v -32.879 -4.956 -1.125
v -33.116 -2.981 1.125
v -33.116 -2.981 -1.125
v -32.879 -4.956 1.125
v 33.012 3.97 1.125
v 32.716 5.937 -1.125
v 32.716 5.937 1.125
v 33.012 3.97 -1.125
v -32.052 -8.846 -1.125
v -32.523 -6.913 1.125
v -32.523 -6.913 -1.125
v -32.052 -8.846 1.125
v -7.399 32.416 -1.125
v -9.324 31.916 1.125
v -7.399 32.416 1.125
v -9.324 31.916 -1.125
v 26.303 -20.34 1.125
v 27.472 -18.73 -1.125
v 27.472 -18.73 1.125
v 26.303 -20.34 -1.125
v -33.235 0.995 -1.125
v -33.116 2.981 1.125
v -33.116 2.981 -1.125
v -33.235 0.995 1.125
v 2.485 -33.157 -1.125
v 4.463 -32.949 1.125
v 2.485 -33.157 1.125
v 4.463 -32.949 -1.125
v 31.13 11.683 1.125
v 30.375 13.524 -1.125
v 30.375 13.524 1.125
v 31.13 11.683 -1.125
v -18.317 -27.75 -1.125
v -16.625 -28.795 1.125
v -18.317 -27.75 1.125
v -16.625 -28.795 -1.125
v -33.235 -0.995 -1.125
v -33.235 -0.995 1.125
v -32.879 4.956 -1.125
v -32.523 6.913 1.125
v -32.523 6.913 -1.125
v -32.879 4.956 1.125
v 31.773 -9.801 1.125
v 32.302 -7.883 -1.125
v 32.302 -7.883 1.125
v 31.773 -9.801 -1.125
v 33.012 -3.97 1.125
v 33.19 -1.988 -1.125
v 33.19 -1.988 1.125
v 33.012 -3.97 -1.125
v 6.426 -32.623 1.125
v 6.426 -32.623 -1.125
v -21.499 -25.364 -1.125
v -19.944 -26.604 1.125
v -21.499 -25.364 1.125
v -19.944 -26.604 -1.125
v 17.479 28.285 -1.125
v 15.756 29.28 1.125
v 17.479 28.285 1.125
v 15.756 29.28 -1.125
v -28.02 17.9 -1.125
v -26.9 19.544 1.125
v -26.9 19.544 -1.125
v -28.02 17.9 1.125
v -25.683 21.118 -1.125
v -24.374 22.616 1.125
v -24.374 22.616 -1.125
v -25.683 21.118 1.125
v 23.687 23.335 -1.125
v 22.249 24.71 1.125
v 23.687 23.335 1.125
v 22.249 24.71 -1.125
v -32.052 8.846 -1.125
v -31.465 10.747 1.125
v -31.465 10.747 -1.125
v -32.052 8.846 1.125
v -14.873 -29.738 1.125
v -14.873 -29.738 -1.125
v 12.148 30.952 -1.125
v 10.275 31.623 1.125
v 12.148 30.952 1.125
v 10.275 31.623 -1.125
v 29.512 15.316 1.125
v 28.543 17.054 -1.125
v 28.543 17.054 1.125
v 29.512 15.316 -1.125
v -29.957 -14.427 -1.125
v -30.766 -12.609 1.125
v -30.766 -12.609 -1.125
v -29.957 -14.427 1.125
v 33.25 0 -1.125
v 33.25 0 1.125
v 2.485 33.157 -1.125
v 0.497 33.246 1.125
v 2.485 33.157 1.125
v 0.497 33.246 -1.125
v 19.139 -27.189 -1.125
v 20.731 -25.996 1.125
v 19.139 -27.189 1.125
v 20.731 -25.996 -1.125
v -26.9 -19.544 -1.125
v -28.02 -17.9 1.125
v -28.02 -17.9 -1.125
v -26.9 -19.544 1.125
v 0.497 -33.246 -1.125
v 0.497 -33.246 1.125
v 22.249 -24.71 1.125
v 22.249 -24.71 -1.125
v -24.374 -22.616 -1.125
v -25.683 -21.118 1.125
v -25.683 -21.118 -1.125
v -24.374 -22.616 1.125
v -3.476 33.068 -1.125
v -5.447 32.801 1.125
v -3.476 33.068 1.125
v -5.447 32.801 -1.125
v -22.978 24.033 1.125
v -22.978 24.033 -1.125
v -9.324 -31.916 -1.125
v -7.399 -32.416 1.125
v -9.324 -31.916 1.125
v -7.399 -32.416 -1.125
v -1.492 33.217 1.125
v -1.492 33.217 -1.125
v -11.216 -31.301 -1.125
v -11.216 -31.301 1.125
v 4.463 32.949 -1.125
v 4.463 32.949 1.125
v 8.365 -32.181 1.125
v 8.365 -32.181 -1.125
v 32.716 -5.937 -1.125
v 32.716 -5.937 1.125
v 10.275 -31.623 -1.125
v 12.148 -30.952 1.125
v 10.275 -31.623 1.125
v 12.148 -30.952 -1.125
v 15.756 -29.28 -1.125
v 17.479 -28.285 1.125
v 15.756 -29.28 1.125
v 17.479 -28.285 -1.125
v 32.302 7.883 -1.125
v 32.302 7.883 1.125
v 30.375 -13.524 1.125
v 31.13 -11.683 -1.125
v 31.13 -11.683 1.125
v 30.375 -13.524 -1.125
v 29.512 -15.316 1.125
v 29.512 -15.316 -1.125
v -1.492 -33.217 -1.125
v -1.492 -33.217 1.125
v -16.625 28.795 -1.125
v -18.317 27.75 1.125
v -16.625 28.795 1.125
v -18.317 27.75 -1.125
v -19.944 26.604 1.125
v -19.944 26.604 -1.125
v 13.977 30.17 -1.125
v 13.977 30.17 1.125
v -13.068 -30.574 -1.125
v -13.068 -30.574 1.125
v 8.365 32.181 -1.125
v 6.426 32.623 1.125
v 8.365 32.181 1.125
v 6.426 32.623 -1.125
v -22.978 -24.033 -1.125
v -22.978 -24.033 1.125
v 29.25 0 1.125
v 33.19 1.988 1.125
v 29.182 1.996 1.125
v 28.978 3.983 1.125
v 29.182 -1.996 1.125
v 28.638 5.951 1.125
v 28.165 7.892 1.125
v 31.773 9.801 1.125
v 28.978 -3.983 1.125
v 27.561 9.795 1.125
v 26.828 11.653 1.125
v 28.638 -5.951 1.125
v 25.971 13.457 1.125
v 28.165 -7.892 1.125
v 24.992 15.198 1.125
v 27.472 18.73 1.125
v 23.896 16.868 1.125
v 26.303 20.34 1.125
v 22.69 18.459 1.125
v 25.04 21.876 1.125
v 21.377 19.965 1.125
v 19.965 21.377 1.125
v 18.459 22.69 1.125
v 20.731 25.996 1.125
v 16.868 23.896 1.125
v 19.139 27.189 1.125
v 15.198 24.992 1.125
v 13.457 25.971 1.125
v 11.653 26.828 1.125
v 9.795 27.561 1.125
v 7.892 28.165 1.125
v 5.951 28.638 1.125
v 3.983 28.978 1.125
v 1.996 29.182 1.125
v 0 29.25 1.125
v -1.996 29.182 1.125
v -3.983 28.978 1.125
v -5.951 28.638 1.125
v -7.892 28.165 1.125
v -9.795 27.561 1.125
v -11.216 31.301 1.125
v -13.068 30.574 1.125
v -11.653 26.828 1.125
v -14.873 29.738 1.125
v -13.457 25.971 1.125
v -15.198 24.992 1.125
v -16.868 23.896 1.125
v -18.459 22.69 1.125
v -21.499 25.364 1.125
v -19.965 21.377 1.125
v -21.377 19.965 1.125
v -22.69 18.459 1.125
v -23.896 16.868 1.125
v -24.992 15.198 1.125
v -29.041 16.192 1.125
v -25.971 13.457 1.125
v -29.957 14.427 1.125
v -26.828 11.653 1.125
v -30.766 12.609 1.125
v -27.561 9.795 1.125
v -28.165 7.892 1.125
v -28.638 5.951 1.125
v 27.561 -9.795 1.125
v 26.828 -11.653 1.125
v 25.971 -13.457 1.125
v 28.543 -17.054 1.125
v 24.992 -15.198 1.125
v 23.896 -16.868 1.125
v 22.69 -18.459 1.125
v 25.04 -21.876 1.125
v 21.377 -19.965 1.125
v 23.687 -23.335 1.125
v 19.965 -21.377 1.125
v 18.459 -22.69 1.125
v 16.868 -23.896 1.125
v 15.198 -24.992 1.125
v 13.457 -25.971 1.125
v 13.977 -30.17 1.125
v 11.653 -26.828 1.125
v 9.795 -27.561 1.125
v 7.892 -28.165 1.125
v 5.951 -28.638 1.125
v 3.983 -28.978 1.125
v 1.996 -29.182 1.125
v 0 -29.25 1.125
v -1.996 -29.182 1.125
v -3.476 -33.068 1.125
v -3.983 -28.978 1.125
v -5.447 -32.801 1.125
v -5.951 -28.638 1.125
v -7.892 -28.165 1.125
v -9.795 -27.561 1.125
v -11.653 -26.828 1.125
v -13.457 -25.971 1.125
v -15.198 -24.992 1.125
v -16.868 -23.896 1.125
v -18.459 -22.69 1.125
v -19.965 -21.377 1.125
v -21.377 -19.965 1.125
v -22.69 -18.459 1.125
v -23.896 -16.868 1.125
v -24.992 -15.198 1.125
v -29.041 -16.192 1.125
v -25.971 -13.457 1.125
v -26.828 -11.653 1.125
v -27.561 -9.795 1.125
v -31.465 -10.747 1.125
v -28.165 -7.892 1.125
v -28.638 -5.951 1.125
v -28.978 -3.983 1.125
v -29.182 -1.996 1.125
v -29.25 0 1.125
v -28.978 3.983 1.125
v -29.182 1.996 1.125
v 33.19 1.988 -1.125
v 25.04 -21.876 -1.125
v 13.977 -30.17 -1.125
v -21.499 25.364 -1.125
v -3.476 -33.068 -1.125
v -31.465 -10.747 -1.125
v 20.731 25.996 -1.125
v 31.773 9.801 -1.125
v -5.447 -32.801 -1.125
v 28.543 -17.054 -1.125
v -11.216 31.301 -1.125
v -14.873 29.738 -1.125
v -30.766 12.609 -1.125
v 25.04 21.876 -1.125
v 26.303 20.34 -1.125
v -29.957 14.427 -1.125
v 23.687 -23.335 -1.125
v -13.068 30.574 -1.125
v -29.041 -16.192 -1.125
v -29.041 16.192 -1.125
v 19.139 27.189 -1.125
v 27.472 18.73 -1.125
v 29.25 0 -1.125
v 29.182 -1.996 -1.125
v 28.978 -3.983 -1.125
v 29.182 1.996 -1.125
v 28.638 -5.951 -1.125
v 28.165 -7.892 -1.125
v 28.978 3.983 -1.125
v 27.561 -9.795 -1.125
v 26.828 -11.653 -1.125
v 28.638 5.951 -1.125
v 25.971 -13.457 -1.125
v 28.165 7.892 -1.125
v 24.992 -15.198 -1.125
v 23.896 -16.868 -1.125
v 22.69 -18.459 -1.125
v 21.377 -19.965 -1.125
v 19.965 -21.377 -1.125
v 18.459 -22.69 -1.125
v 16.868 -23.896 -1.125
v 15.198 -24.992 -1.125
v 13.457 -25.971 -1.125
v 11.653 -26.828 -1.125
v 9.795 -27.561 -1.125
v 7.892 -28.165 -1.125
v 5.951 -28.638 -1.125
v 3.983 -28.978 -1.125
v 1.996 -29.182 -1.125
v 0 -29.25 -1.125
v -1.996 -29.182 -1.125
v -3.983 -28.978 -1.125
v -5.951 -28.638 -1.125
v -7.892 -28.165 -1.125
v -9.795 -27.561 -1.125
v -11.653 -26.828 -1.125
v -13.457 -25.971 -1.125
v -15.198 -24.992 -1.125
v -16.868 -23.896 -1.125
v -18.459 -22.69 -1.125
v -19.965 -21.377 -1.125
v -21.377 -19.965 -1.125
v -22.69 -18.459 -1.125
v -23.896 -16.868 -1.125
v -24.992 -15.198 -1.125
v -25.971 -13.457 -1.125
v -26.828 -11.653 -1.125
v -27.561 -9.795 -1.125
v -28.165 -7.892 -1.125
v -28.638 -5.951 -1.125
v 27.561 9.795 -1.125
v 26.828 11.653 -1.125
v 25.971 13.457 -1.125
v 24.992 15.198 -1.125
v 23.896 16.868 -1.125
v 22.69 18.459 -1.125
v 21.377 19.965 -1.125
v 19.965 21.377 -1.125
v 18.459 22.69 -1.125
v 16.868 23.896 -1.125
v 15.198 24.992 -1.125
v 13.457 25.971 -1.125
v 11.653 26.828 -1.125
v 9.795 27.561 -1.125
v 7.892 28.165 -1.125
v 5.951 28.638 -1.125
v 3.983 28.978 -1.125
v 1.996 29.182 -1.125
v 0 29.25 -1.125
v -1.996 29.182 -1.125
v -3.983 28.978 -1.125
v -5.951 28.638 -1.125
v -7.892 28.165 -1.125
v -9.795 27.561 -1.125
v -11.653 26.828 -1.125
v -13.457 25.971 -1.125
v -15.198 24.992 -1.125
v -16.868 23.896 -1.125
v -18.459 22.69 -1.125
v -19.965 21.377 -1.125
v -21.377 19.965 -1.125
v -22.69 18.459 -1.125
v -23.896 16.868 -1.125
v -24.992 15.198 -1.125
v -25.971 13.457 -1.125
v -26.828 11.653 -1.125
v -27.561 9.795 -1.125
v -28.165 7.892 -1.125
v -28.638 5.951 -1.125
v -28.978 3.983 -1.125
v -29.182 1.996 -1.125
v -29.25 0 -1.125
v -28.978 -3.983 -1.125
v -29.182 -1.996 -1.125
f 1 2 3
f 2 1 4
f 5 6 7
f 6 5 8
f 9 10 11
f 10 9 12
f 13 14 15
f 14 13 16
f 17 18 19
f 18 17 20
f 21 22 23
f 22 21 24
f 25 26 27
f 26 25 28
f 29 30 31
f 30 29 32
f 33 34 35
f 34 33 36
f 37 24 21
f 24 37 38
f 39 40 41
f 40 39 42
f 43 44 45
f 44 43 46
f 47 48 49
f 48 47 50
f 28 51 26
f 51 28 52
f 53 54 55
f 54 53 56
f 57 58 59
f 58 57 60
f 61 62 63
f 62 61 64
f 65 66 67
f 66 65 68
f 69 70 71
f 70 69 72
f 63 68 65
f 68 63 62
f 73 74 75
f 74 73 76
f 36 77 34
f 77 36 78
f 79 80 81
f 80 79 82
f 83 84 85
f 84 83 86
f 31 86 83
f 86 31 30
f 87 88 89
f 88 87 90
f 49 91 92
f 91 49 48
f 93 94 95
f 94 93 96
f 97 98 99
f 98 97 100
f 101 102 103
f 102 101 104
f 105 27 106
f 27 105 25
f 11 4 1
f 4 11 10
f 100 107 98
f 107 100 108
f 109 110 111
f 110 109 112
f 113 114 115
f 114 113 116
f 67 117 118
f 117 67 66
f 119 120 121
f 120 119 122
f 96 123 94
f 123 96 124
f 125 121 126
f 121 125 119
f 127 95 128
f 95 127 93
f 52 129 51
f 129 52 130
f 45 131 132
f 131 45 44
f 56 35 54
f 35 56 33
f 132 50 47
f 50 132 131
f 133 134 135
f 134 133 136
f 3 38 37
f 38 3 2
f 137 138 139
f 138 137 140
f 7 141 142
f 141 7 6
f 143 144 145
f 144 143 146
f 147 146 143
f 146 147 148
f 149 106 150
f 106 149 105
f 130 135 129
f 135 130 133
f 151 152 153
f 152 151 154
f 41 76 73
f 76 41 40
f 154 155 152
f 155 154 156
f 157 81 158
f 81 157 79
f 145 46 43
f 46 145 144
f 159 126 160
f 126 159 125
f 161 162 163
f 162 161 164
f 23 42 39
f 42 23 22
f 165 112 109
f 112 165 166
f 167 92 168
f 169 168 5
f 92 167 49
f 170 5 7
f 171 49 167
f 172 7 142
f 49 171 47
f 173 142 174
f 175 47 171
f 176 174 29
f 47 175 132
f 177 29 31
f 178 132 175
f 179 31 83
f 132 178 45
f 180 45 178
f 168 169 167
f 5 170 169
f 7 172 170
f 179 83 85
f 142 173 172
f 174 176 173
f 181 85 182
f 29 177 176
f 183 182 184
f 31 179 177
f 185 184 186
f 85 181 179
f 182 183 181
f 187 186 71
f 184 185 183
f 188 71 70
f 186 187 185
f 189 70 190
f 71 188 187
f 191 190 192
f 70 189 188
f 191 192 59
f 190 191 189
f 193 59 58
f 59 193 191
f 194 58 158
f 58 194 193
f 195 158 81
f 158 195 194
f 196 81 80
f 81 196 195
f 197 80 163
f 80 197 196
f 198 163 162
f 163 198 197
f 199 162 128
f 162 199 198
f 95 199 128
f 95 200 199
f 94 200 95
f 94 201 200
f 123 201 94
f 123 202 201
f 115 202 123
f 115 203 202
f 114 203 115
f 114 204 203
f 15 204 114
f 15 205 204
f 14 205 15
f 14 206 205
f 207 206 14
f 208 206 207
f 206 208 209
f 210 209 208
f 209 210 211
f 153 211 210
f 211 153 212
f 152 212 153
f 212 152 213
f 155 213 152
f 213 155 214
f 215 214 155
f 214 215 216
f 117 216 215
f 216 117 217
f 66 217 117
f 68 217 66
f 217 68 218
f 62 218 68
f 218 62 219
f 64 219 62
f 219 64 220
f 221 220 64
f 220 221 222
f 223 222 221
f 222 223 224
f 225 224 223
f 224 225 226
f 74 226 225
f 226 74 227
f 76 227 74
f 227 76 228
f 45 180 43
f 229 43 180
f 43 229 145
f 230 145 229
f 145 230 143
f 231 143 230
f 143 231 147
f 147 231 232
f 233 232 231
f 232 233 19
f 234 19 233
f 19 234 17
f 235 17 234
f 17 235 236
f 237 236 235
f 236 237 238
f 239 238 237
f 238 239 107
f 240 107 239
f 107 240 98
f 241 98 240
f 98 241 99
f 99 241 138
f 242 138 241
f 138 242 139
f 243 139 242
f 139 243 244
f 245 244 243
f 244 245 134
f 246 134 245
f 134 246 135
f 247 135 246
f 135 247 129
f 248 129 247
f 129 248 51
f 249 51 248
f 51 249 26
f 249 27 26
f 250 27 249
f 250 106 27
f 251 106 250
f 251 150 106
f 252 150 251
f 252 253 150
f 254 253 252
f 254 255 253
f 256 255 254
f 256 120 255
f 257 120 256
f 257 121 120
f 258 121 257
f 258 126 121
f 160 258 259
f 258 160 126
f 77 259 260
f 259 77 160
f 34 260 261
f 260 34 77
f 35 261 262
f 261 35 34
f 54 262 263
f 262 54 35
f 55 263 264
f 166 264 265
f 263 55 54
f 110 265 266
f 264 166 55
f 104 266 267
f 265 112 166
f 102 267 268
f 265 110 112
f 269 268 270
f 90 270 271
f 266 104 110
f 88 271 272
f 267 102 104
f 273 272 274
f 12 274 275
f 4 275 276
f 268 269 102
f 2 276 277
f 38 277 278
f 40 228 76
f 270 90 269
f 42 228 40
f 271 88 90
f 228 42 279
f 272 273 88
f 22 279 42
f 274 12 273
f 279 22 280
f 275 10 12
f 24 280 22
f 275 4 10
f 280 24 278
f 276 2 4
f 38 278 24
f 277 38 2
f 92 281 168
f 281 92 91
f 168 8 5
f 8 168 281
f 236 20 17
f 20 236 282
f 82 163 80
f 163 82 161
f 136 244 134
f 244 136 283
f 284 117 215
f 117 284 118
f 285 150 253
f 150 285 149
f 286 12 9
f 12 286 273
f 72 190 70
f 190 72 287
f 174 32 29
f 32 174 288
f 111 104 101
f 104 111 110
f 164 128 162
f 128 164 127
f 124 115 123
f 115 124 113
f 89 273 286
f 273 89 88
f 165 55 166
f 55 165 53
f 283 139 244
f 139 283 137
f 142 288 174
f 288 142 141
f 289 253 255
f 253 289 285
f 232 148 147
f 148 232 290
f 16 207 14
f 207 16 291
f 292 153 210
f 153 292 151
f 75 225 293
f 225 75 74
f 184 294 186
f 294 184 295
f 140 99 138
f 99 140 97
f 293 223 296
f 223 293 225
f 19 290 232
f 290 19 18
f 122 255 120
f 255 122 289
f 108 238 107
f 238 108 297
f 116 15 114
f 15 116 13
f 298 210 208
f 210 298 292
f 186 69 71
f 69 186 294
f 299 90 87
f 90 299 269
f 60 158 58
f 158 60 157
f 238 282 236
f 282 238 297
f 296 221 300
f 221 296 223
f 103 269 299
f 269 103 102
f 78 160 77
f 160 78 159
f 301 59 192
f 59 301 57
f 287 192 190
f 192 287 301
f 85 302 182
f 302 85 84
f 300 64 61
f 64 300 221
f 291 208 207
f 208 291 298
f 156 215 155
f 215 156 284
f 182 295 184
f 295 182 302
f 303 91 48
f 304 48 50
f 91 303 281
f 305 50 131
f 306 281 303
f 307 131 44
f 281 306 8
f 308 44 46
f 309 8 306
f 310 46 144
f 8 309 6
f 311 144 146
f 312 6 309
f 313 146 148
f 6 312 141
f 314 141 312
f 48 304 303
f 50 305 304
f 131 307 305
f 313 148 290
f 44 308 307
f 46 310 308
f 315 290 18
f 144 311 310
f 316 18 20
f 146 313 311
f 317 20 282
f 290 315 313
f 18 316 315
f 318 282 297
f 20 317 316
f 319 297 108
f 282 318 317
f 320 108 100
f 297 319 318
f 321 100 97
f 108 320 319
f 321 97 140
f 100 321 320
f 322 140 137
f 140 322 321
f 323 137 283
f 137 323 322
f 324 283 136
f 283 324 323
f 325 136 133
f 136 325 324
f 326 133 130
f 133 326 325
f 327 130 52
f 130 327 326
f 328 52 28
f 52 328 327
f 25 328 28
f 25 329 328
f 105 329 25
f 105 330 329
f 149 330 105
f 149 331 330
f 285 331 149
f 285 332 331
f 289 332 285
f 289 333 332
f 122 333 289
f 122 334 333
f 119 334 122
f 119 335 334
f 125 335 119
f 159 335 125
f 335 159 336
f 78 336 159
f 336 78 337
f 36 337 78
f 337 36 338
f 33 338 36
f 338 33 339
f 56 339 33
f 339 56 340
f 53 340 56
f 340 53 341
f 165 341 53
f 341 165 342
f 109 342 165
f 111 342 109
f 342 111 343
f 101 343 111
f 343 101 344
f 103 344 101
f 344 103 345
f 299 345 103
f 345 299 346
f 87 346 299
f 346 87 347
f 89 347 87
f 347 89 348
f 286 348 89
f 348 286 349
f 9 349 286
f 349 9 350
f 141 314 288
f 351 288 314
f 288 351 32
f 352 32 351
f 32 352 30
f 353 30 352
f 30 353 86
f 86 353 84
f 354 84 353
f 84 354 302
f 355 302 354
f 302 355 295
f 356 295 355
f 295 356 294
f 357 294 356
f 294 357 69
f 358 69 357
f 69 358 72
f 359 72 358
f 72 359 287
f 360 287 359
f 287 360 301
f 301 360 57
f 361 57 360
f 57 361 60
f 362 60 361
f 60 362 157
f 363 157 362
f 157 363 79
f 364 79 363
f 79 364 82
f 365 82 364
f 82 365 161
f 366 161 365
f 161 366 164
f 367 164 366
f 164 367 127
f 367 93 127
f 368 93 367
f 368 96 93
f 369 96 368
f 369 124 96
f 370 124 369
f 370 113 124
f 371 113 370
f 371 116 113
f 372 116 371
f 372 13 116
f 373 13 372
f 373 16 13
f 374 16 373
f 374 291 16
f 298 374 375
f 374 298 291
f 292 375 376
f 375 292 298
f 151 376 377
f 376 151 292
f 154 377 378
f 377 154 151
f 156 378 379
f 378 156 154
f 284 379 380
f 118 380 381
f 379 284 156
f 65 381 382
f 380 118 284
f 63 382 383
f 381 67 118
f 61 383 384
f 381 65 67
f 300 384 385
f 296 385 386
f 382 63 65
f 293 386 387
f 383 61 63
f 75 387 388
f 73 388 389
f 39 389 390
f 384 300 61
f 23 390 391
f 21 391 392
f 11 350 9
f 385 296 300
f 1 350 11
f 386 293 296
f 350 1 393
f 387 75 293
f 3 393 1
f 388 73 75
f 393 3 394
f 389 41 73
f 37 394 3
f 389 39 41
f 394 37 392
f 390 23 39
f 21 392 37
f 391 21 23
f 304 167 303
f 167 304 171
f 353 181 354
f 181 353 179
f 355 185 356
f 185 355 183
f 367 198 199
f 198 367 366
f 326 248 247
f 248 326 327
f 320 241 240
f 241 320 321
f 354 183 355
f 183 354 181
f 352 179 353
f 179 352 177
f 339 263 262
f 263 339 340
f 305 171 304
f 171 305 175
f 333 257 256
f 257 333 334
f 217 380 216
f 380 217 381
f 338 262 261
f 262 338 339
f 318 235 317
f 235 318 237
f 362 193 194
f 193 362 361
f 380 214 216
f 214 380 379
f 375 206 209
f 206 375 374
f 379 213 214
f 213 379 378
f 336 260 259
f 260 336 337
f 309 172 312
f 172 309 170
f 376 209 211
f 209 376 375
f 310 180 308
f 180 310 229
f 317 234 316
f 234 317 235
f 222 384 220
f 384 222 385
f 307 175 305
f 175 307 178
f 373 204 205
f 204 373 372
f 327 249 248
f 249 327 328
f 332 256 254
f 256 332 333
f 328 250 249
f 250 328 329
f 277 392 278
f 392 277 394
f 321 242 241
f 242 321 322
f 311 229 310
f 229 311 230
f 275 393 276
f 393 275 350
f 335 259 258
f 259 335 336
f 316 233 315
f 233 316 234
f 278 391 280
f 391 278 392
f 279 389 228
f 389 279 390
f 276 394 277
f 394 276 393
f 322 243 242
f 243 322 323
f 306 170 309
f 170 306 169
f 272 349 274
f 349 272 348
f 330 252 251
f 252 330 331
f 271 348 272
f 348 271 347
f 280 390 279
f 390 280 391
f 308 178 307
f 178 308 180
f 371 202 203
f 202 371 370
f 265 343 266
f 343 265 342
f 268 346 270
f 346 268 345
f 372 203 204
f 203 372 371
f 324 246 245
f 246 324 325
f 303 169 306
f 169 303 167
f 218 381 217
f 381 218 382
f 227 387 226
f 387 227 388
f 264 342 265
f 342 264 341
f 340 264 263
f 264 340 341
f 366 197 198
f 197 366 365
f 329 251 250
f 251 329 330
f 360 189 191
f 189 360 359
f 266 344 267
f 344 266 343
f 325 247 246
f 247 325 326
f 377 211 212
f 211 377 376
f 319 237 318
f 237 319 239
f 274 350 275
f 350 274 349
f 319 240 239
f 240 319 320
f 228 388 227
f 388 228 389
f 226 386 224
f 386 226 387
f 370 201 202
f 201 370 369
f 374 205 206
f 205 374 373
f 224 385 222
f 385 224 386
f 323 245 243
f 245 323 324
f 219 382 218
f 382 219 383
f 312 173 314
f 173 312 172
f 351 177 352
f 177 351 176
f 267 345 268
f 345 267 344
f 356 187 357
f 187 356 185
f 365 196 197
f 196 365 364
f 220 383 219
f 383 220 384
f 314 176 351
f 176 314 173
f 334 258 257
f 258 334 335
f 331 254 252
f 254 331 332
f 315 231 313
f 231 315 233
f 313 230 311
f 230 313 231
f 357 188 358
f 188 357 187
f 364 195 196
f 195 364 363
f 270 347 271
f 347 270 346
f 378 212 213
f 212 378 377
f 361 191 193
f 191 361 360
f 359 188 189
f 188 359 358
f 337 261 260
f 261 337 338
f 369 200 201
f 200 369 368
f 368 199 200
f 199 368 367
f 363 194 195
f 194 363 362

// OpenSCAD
DIA_OUTER_RING =  66.5;
DIA_INNER_RING = DIA_OUTER_RING -2*4.0;
HEIGHT_RING = 2.25;

difference(){
	linear_extrude(height = HEIGHT_RING, center = true){
		circle(d=DIA_OUTER_RING, $fa = 0.01);
	}

	linear_extrude(height = 4*HEIGHT_RING, center = true){
		circle(d=DIA_INNER_RING, , $fa = 0.01);
	}
}
